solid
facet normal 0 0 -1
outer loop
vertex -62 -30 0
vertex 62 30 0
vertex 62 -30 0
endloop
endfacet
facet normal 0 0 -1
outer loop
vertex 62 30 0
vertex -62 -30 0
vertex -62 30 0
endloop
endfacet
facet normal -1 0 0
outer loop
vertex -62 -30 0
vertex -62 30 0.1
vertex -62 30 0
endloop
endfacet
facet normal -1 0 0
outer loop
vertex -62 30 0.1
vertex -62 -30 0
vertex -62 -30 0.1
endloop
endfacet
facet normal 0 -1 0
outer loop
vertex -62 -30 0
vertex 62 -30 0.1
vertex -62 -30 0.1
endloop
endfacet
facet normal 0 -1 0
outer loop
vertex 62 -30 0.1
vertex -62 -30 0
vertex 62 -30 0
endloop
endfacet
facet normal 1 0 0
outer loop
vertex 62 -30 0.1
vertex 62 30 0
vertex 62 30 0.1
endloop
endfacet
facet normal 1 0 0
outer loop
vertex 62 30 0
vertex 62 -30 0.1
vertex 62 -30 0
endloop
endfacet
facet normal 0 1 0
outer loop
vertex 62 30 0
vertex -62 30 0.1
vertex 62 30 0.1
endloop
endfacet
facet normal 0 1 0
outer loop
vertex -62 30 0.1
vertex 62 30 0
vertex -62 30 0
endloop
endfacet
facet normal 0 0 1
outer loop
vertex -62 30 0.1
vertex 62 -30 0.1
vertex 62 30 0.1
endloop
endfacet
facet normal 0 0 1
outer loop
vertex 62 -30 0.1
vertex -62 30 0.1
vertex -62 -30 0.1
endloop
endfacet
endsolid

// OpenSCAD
// file: ../p/box5-12.scad
use <../lib.scad>
function ldraw_lib__box5_12() = [
// 0 Box with 5 Faces without Any Edges
// 0 Name: box5-12.dat
// 0 Author: Chris Dee [cwdee]
// 0 !LDRAW_ORG Primitive UPDATE 2009-02
// 0 !LICENSE Licensed under CC BY 4.0 : see CAreadme.txt
// 
// 0 BFC CERTIFY CCW
  [0,"BFC","CERTIFY"],
  [0,"BFC","CCW"],
// 
// 0 !HISTORY 2009-09-03 [PTadmin] Official Update 2009-02
// 
// 
// 4 16 1 1 1 1 1 -1 -1 1 -1 -1 1 1
  [4,16,1,1,1,1,1,-1,-1,1,-1,-1,1,1],
// 4 16 -1 0 1 1 0 1 1 1 1 -1 1 1
  [4,16,-1,0,1,1,0,1,1,1,1,-1,1,1],
// 4 16 -1 0 -1 -1 0 1 -1 1 1 -1 1 -1
  [4,16,-1,0,-1,-1,0,1,-1,1,1,-1,1,-1],
// 4 16 1 0 -1 -1 0 -1 -1 1 -1 1 1 -1
  [4,16,1,0,-1,-1,0,-1,-1,1,-1,1,1,-1],
// 4 16 1 0 1 1 0 -1 1 1 -1 1 1 1
  [4,16,1,0,1,1,0,-1,1,1,-1,1,1,1],
// 0
];
module ldraw_lib__box5_12(step=0, col=false, unit=2/5, alt=false, line=0.2, solid=!$preview)
    makepoly(ldraw_lib__box5_12(), step=step, col=col, unit=unit, alt=alt, line=line, solid=solid);
ldraw_lib__box5_12(line=0.2);
// main file
use <../lib.scad>
use <../p/box5-12.scad>
function ldraw_lib__6338501a() = [
// 0 Sticker  7.5 x 15.5 with BMW Motorrad M 1000 RR Specifications
// 0 Name: 6338501a.dat
// 0 Author: Philippe Hurbain [Philo]
// 0 !LDRAW_ORG Part UPDATE 2024-05
// 0 !LICENSE Licensed under CC BY 4.0 : see CAreadme.txt
// 
// 0 BFC CERTIFY CCW
  [0,"BFC","CERTIFY"],
  [0,"BFC","CCW"],
// 
// 0 !KEYWORDS Set 42130
// 
// 0 !HISTORY 2024-06-30 [OrionP] Official Update 2024-05
// 
// 
// 1 16 0 -0.25 0 0 0 -155 0 0.25 0 75 0 0 box5-12.dat
  [1,16,0,-0.25,0,0,0,-155,0,0.25,0,75,0,0, ldraw_lib__box5_12()],
// 0 !TEXMAP START PLANAR -155 -0.25 75 155 -0.25 75 -155 -0.25 -75 6338501a.png
// 0 !: 4 0 -155 -0.25 75 -155 -0.25 -75 155 -0.25 -75 155 -0.25 75
// 0 !TEXMAP FALLBACK
// 0 // Needs Work: fallback pattern
// 4 0 -155 -0.25 75 -155 -0.25 -75 155 -0.25 -75 155 -0.25 75
  [4,0,-155,-0.25,75,-155,-0.25,-75,155,-0.25,-75,155,-0.25,75],
// 0 !TEXMAP END
];
module ldraw_lib__6338501a(step=0, col=false, unit=2/5, alt=false, line=0.2, solid=!$preview)
    makepoly(ldraw_lib__6338501a(), step=step, col=col, unit=unit, alt=alt, line=line, solid=solid);
ldraw_lib__6338501a(line=0.2);
